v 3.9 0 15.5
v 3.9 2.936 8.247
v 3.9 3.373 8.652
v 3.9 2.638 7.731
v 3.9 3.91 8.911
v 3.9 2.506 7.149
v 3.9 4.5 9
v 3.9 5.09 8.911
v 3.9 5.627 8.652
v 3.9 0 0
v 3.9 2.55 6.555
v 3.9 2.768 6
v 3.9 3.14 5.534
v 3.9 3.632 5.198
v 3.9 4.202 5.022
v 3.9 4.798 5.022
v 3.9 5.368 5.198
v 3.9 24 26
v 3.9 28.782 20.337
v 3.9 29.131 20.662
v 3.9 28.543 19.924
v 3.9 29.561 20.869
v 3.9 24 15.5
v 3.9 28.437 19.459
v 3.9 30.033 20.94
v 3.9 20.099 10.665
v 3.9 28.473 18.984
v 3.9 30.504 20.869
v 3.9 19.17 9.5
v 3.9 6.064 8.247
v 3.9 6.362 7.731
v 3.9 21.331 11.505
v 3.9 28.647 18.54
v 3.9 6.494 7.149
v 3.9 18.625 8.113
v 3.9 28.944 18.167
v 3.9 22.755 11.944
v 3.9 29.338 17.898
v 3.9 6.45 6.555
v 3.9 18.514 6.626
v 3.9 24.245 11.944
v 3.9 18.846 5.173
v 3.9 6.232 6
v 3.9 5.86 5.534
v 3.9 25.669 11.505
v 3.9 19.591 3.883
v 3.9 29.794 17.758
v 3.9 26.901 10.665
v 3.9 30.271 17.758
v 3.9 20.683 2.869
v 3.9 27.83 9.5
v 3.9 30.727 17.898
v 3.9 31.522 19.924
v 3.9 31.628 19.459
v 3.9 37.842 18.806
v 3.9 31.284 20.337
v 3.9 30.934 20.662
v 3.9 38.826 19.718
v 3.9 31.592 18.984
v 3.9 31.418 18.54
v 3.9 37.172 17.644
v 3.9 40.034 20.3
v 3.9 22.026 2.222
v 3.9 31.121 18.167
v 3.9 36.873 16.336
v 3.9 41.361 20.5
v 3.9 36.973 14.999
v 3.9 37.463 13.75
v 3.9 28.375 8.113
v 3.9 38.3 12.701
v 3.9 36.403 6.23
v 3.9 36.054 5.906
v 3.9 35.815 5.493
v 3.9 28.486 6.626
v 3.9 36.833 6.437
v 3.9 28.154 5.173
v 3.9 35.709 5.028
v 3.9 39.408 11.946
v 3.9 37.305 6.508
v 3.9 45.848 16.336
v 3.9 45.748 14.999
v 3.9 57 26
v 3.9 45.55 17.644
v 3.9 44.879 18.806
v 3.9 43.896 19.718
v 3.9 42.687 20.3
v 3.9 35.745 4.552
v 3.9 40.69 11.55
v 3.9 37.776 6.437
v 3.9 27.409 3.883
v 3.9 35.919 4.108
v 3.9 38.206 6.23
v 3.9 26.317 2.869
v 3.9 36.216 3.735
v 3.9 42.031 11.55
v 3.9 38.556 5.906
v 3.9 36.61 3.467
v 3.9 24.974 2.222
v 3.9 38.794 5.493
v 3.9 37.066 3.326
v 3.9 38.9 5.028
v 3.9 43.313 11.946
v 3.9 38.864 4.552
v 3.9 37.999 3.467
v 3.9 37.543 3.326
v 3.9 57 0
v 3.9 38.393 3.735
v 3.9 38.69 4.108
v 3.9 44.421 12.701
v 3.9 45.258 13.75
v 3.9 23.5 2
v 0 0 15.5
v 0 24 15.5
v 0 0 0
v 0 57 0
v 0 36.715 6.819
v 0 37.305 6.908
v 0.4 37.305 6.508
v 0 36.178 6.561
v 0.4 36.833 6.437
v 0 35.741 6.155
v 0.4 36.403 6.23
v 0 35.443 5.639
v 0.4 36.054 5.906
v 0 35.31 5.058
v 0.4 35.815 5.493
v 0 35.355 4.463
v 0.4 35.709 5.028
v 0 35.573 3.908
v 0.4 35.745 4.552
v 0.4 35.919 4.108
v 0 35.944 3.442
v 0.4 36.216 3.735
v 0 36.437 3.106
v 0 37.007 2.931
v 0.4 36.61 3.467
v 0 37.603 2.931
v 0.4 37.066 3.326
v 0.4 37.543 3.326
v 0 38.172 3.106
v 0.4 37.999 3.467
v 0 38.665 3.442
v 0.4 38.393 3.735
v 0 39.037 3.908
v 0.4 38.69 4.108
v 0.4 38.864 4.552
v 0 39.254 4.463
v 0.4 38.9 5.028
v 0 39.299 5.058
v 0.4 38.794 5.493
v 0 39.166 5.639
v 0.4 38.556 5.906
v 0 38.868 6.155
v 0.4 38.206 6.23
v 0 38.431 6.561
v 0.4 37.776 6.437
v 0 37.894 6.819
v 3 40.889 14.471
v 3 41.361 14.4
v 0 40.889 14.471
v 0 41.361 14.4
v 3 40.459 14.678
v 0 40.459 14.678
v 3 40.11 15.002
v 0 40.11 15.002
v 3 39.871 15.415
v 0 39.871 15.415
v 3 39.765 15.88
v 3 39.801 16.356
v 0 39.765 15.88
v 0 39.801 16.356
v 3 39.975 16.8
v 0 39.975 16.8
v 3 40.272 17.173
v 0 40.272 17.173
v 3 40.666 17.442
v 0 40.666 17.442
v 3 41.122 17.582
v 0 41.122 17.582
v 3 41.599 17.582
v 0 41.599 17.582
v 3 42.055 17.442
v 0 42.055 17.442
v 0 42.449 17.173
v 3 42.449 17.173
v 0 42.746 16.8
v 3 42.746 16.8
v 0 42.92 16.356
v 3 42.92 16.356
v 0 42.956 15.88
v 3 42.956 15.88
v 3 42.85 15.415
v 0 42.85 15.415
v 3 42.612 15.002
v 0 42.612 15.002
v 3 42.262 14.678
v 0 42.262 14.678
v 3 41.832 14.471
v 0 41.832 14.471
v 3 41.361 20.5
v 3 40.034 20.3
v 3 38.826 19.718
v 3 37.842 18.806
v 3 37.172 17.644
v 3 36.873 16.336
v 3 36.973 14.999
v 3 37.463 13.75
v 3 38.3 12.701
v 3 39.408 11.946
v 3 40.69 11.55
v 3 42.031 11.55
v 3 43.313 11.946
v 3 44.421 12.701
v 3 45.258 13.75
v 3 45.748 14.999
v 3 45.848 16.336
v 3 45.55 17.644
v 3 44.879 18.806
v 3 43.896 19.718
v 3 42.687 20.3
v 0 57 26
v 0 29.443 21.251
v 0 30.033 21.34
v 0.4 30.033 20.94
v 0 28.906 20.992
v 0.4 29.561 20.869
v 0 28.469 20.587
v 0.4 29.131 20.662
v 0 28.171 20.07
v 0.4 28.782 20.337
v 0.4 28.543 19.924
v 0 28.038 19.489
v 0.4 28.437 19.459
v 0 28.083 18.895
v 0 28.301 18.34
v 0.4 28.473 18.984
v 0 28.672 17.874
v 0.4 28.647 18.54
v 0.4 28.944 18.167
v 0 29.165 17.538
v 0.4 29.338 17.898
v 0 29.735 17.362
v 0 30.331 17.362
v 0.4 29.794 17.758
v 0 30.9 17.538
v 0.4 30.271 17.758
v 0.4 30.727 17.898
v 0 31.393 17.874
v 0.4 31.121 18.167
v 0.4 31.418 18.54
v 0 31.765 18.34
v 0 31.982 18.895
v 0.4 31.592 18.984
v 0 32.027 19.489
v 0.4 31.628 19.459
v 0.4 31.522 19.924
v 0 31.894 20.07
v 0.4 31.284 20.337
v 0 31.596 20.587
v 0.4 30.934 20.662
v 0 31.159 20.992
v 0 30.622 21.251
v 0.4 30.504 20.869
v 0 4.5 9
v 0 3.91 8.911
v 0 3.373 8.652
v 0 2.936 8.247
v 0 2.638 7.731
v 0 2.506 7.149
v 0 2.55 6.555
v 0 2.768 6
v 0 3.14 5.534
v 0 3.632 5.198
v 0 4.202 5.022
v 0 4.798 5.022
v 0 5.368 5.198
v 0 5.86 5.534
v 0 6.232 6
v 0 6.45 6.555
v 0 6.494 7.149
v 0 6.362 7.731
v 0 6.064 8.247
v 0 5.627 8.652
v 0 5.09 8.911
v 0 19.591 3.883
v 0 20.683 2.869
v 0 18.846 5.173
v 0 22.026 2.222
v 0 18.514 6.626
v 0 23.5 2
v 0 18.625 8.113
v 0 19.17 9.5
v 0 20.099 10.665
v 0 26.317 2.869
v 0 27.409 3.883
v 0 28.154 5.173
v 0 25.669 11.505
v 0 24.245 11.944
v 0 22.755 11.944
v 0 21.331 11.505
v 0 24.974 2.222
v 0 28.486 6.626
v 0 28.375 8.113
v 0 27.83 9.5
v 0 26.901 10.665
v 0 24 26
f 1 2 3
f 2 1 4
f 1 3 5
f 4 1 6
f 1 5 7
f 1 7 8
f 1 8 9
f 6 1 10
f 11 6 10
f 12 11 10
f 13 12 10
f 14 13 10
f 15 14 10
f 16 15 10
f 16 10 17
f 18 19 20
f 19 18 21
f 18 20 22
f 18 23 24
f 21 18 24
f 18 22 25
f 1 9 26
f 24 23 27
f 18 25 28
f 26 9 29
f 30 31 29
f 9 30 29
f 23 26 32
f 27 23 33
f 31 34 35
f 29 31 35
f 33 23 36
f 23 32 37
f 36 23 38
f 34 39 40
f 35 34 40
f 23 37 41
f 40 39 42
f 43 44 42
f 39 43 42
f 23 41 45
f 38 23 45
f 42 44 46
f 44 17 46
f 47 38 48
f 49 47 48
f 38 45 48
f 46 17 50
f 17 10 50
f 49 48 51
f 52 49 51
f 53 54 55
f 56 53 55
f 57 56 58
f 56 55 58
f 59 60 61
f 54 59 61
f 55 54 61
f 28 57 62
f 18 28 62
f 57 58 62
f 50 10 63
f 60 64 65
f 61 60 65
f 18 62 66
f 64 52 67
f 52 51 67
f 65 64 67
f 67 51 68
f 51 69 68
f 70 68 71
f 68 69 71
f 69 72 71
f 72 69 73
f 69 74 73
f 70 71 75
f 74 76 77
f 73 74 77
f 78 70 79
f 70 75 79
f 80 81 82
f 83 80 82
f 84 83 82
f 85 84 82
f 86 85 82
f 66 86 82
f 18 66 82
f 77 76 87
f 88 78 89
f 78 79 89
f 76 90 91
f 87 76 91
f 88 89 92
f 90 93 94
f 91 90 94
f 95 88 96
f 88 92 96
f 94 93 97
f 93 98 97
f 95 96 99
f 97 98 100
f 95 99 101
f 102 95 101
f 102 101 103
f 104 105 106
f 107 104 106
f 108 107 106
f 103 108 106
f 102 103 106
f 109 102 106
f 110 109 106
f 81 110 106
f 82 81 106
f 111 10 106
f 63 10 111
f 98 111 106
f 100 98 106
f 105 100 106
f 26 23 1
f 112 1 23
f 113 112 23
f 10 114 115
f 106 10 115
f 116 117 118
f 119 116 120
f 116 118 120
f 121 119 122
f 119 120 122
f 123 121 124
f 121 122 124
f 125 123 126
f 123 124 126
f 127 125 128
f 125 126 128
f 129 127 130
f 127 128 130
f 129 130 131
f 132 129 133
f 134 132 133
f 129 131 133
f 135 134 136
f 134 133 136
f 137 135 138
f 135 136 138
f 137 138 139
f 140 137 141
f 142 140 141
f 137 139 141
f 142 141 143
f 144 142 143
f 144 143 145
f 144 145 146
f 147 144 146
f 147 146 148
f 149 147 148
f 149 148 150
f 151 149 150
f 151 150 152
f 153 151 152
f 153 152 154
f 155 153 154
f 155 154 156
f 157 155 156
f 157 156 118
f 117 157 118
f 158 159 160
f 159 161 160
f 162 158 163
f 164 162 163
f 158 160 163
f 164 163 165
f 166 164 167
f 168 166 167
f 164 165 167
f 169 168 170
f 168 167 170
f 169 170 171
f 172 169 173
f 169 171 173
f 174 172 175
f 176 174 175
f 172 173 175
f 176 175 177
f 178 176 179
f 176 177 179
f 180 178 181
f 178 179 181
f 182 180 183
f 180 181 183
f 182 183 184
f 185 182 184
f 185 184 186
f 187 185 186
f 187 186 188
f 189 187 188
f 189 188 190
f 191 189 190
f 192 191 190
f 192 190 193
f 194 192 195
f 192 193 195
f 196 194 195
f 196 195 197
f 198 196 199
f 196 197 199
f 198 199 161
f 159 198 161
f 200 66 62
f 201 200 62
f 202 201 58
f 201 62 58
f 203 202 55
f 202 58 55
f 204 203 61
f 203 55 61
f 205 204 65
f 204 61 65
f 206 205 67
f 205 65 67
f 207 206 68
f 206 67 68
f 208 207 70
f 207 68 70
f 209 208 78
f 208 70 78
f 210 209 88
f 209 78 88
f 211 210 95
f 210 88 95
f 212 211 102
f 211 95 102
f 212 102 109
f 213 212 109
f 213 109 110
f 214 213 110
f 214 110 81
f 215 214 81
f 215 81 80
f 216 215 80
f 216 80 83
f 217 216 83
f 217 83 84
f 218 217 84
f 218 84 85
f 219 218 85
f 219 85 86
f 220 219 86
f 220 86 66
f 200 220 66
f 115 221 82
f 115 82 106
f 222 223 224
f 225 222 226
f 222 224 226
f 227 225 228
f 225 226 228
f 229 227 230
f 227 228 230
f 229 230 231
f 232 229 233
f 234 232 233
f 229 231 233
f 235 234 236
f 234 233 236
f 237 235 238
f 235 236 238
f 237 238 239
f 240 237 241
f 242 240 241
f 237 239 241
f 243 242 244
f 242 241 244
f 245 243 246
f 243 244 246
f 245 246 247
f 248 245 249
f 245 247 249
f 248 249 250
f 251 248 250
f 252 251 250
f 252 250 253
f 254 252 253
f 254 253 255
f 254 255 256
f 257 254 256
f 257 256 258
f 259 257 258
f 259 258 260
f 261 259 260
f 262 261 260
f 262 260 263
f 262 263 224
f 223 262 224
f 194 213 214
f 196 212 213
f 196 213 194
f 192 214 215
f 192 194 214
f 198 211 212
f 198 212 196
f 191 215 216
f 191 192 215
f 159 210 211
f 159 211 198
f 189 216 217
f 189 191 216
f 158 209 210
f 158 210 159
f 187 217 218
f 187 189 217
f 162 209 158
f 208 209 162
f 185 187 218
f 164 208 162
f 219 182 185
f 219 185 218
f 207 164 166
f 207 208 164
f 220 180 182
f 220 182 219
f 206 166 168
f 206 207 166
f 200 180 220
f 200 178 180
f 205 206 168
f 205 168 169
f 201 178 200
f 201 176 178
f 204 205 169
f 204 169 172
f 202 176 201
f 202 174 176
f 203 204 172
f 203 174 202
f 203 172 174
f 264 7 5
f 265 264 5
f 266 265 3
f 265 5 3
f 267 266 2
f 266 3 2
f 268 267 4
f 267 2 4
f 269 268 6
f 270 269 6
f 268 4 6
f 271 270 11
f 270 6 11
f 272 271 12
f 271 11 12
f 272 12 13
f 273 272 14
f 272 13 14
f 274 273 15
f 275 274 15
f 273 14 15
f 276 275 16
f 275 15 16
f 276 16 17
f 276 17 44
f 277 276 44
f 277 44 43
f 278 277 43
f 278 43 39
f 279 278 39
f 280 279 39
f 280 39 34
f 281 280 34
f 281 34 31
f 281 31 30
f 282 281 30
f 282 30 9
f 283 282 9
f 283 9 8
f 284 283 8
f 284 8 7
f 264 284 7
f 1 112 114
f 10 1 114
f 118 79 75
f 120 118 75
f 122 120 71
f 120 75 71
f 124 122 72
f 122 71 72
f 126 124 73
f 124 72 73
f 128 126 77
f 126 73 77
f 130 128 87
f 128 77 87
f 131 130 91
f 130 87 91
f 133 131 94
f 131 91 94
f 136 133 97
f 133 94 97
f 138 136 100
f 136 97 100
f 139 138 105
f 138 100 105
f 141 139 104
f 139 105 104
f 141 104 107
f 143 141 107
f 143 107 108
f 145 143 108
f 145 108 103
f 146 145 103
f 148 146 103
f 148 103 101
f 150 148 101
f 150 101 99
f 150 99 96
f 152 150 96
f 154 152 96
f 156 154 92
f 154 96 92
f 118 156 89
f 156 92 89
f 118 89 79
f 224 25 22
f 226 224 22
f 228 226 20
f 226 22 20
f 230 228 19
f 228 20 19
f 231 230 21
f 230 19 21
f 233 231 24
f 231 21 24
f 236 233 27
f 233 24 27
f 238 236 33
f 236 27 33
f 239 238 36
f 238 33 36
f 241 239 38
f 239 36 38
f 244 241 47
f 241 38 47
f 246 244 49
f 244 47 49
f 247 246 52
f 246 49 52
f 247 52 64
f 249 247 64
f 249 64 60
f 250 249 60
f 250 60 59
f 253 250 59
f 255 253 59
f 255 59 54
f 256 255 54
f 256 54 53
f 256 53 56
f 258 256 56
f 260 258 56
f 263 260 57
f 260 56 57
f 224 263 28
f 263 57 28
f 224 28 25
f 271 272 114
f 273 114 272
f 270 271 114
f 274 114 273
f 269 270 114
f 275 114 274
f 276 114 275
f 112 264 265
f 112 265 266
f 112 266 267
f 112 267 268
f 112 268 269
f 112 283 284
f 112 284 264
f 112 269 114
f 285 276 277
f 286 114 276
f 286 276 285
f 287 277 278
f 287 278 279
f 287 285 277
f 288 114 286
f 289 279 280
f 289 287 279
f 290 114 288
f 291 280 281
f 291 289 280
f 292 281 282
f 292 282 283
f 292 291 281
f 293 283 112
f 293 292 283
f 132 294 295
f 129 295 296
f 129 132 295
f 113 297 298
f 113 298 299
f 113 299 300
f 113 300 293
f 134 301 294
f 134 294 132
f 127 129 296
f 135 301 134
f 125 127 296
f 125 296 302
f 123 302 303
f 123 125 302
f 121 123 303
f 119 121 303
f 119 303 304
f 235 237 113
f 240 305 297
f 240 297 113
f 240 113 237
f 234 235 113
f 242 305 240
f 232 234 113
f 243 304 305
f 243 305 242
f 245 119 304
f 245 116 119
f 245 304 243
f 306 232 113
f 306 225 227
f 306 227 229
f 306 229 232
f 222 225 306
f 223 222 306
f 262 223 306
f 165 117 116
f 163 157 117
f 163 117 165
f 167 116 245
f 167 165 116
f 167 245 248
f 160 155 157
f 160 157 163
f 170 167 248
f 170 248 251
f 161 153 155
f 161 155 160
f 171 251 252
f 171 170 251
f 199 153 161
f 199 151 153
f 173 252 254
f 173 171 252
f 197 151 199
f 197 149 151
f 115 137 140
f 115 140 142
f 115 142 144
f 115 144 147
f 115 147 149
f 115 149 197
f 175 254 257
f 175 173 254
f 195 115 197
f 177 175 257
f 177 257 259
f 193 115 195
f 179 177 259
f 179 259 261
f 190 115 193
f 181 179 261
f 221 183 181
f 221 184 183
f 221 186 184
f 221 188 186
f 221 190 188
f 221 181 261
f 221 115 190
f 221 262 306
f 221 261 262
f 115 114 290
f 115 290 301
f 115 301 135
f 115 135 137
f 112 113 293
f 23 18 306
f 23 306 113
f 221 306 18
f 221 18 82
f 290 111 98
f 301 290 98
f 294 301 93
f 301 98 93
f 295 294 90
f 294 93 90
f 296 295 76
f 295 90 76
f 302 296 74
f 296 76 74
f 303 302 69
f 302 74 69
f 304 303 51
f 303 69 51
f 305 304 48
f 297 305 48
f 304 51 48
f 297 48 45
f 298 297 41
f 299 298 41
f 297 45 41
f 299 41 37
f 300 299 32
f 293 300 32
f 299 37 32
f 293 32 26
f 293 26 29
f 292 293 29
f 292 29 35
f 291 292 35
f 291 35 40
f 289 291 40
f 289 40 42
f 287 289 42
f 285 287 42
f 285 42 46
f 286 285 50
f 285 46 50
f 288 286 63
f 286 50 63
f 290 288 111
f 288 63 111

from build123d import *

# Parameters (mm, degrees)
SKETCH1_W                                        = 30
SKETCH1_H                                        = 57
BOSS_EXTRUDE1_DEPTH                              = 4
SKETCH2_R                                        = 5
CUT_EXTRUDE1_DEPTH                               = 65.536811201
F_4_0_4_DIAMETER_HOLE1_D                         = 4
SKETCH12_W                                       = 14.5
SKETCH12_H                                       = 24
CUT_EXTRUDE2_DEPTH                               = 65.536811201
SKETCH13_W                                       = 42.673617324
SKETCH13_H                                       = 65.779819875
CUT_EXTRUDE5_DEPTH                               = 4
F_4_0_4_DIAMETER_HOLE6_D                         = 4
CBORE_FOR_M3_PAN_HEAD_MACHINE_SCREW7_D           = 3.2
CBORE_FOR_M3_PAN_HEAD_MACHINE_SCREW7_CBORE_D     = 9
CBORE_FOR_M3_PAN_HEAD_MACHINE_SCREW7_CBORE_DEPTH = 1
CSK_FOR_M3_FLAT_HEAD_MACHINE_SCREW1_D            = 3.2
CSK_FOR_M3_FLAT_HEAD_MACHINE_SCREW1_CSINK_D      = 4
CSK_FOR_M3_FLAT_HEAD_MACHINE_SCREW1_CSINK_ANGLE  = 90
CUT_EXTRUDE6_DEPTH                               = 65.536811201
CUT_EXTRUDE6_DEPTH_BACK                          = 65.536811201
SKETCH45_W                                       = 4
SKETCH45_H                                       = 33
SKETCH46_W                                       = 0.1
SKETCH46_H                                       = 57
CUT_EXTRUDE7_DEPTH                               = 63.777384463


with BuildPart() as part:
    # Sketch1 → Boss-Extrude1 (new body)
    with BuildSketch(Plane(origin=(0, 0, 0), x_dir=(0, 0, -1), z_dir=(1, 0, 0))):
        with Locations((-15, 28.5)):
            Rectangle(SKETCH1_W, SKETCH1_H)
    boss_extrude1 = extrude(amount=-BOSS_EXTRUDE1_DEPTH)

    # Sketch2 → Cut-Extrude1 (cut, through all)
    with BuildSketch(Plane(origin=(0, 0, 0), x_dir=(0, 0, -1), z_dir=(1, 0, 0))):
        with Locations((-7, 23.5)):
            Circle(SKETCH2_R)
    cut_extrude1 = extrude(amount=-CUT_EXTRUDE1_DEPTH, mode=Mode.SUBTRACT)

    # Ø4.0 (4) Diameter Hole1 (through all)
    with Locations(Plane(origin=(0, 4.5, 7), x_dir=(0, 0, 1), z_dir=(1, 0, 0))):
        with Locations((0, 0)):
            Hole(F_4_0_4_DIAMETER_HOLE1_D / 2)

    # Sketch12 → Cut-Extrude2 (cut, through all)
    with BuildSketch(Plane(origin=(0, 0, 0), x_dir=(0, 0, -1), z_dir=(1, 0, 0))):
        with Locations((-22.75, 12)):
            Rectangle(SKETCH12_W, SKETCH12_H)
    cut_extrude2 = extrude(amount=-CUT_EXTRUDE2_DEPTH, mode=Mode.SUBTRACT)

    # Mirror7: Boss-Extrude1, Cut-Extrude1, Cut-Extrude2 across plane
    add(boss_extrude1.mirror(Plane(origin=(0, 0, 0), x_dir=(0, 0, 1), z_dir=(1, 0, 0))))
    add(cut_extrude1.mirror(Plane(origin=(0, 0, 0), x_dir=(0, 0, 1), z_dir=(1, 0, 0))), mode=Mode.SUBTRACT)
    add(cut_extrude2.mirror(Plane(origin=(0, 0, 0), x_dir=(0, 0, 1), z_dir=(1, 0, 0))), mode=Mode.SUBTRACT)

    # Sketch13 → Cut-Extrude5 (cut)
    with BuildSketch(Plane.ZY.offset(4)):
        with Locations((15.520409967, 28.395918007)):
            Rectangle(SKETCH13_W, SKETCH13_H)
    extrude(amount=-CUT_EXTRUDE5_DEPTH, mode=Mode.SUBTRACT)

    # Ø4.0 (4) Diameter Hole6 (through all)
    with Locations(Plane(origin=(0, 4.5, 7), x_dir=(0, 0, -1), z_dir=(-1, 0, 0))):
        with Locations((0, 0)):
            Hole(F_4_0_4_DIAMETER_HOLE6_D / 2)

    # CBORE for M3 Pan Head Machine Screw7 (through all)
    with Locations(Plane(origin=(4, 41.360571099, 16), x_dir=(0, 0, 1), z_dir=(1, 0, 0))):
        with Locations((0, 0)):
            CounterBoreHole(CBORE_FOR_M3_PAN_HEAD_MACHINE_SCREW7_D / 2, CBORE_FOR_M3_PAN_HEAD_MACHINE_SCREW7_CBORE_D / 2, CBORE_FOR_M3_PAN_HEAD_MACHINE_SCREW7_CBORE_DEPTH)

    # CSK for M3 Flat Head Machine Screw1 (through all)
    with Locations(Plane(origin=(0, 30.032608687, 19.33966579), x_dir=(0, 0, -1), z_dir=(-1, 0, 0))):
        with Locations((0, 0), (14.431341448, -7.272)):
            CounterSinkHole(CSK_FOR_M3_FLAT_HEAD_MACHINE_SCREW1_D / 2, CSK_FOR_M3_FLAT_HEAD_MACHINE_SCREW1_CSINK_D / 2, counter_sink_angle=CSK_FOR_M3_FLAT_HEAD_MACHINE_SCREW1_CSINK_ANGLE)

    # Sketch45 → Cut-Extrude6 (cut, two sides: drawn at the far end of the back side and taken through both)
    with BuildSketch(Plane(origin=(4, 0, 0), x_dir=(0, 0, -1), z_dir=(1, 0, 0)).offset(-CUT_EXTRUDE6_DEPTH_BACK)):
        with Locations((-28, 40.5)):
            Rectangle(SKETCH45_W, SKETCH45_H)
    extrude(amount=CUT_EXTRUDE6_DEPTH + CUT_EXTRUDE6_DEPTH_BACK, mode=Mode.SUBTRACT)

    # Sketch46 → Cut-Extrude7 (cut, through all)
    with BuildSketch(Plane(origin=(0, 0, 0), x_dir=(-1, 0, 0), z_dir=(0, 0, -1))):
        with Locations((-3.95, 28.5)):
            Rectangle(SKETCH46_W, SKETCH46_H)
    extrude(amount=-CUT_EXTRUDE7_DEPTH, mode=Mode.SUBTRACT)


solid = part.part
